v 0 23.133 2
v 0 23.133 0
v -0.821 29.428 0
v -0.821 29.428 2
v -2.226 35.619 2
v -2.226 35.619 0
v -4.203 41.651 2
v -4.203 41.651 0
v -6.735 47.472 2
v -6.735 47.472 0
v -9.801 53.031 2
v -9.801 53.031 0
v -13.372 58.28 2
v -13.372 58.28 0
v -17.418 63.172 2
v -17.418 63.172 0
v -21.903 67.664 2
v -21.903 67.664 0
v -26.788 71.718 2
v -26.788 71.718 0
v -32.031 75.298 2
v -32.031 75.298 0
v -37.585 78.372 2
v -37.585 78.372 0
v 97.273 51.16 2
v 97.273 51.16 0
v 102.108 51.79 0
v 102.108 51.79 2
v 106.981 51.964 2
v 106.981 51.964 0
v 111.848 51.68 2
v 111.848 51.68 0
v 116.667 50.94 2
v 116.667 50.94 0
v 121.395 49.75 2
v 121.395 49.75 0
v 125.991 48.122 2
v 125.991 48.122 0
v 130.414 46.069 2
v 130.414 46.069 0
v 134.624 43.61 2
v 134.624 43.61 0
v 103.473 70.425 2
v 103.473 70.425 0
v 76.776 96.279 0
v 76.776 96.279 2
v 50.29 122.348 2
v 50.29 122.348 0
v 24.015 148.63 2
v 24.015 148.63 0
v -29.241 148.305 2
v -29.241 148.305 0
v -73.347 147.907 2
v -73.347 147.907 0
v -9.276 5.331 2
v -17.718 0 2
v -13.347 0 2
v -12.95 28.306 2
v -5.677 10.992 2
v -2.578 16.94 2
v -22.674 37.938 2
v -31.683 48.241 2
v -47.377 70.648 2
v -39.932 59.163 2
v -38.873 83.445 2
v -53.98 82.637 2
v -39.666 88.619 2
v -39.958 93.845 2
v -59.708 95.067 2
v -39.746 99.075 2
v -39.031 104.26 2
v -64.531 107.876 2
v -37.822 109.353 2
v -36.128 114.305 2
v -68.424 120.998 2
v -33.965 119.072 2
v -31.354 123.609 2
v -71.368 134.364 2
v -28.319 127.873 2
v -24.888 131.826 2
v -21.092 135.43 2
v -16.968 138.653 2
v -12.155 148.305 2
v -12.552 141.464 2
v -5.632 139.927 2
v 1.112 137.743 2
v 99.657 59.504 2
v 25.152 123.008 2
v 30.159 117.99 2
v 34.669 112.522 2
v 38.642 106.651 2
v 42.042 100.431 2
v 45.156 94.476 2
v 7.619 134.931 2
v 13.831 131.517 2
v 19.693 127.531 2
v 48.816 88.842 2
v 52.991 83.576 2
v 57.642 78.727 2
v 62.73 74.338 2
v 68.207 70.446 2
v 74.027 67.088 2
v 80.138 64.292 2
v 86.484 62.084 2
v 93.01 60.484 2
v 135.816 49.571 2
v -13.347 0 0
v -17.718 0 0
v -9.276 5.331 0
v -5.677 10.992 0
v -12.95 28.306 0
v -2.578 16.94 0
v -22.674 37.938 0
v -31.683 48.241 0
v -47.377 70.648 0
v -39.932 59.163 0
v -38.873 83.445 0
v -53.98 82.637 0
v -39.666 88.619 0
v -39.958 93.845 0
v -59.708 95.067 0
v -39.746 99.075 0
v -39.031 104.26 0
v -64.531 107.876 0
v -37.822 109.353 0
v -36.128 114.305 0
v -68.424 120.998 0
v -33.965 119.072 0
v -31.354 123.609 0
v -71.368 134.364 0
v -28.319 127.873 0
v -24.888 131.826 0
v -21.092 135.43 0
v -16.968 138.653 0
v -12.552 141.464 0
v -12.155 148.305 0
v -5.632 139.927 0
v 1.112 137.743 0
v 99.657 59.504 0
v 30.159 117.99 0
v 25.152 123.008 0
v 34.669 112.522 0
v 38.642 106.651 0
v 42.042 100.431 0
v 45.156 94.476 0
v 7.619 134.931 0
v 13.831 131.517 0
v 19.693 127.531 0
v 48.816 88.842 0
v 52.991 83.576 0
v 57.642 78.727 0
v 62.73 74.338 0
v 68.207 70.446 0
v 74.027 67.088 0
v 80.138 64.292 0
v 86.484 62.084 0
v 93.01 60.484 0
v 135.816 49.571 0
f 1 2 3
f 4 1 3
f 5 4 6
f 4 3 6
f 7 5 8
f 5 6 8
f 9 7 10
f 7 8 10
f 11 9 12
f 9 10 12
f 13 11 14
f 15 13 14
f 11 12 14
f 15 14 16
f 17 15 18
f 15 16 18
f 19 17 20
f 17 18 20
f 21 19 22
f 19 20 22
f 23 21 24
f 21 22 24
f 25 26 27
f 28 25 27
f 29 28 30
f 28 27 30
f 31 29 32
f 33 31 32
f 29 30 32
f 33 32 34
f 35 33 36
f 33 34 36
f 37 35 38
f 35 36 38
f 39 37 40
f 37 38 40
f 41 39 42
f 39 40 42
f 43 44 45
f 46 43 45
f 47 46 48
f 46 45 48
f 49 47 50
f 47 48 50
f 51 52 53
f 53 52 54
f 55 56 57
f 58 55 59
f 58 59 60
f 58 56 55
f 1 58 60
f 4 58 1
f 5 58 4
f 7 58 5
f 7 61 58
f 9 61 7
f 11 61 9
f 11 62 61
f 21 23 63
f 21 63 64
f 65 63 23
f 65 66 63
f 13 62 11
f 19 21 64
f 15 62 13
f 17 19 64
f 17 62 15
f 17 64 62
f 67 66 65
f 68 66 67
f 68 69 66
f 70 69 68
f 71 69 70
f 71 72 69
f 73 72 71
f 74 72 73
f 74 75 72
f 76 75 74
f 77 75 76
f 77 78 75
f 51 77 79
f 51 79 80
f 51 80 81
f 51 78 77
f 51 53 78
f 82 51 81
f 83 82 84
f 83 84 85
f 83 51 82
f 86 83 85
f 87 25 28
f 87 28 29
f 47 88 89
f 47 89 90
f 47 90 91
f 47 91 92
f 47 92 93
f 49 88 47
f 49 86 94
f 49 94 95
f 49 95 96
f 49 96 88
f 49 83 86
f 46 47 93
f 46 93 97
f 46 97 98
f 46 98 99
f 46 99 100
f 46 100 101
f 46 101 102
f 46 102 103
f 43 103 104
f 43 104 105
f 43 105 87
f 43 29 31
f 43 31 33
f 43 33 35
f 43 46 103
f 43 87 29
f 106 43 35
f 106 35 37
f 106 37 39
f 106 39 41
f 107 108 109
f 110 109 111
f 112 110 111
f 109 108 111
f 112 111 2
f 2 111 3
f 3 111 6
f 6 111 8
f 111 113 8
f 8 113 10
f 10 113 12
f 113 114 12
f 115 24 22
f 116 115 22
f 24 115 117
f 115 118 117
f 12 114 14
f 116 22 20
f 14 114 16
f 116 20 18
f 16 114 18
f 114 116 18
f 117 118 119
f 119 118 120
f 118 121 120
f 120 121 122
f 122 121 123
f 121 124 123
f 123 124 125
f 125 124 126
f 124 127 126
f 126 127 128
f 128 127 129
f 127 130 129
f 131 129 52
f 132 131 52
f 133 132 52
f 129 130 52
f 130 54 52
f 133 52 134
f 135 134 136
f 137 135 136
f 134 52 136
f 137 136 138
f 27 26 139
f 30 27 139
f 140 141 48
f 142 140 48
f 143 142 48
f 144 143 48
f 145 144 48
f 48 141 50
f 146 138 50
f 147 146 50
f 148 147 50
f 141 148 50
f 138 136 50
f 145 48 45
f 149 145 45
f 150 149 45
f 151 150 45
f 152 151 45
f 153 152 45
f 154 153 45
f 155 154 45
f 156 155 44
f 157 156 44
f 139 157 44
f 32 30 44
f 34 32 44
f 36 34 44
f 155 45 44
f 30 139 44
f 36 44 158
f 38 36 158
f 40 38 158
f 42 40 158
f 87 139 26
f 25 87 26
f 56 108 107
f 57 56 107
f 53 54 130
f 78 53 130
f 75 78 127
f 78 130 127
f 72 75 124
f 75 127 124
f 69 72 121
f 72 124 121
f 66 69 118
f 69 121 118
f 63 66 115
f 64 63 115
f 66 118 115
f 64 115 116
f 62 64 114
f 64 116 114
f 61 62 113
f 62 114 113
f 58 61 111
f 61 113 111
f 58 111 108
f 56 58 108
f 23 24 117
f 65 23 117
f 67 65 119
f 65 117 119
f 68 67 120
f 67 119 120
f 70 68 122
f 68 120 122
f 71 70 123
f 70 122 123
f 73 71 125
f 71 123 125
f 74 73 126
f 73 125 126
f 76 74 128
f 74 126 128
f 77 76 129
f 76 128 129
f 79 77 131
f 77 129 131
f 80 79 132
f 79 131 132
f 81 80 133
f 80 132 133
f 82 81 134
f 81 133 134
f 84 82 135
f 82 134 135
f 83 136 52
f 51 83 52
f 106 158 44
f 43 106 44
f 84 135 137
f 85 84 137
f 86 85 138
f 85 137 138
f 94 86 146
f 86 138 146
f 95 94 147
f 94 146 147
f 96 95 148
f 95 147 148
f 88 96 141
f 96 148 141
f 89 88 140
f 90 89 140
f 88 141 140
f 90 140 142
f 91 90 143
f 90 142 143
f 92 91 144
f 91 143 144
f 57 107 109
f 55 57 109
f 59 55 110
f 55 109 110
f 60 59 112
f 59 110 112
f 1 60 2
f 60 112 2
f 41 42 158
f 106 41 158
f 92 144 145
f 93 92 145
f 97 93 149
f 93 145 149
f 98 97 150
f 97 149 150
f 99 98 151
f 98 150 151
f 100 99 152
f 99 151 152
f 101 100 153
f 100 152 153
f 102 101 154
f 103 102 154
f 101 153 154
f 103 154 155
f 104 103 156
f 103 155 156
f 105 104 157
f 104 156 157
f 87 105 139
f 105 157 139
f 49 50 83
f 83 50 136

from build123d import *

# Parameters (mm, degrees)
F1_DEPTH = 2


# Not quite as in the source:
# - a feature names something its author has since deleted; it is built from what else it names


with BuildPart() as f1:
    # F0 (on Top) → F1 (new body)
    with BuildSketch(Plane.XY):
        with BuildLine():
            Line((-17.7180729806, 0), (-13.3472634479, 0))
            ThreePointArc((-13.3472634479, 0), (-5.6771986993, 10.9915241569), (0, 23.1328960508))
            ThreePointArc((0, 23.1328960508), (-11.5247073045, 55.6975197064), (-37.5854000449, 78.3715993166))
            ThreePointArc((-37.5854000449, 78.3715993166), (-36.1278357664, 114.3054992712), (-12.5523087913, 141.4636322597))
            ThreePointArc((-12.5523087913, 141.4636322597), (19.6930692126, 127.5307837734), (42.0421807398, 100.4308597236))
            ThreePointArc((42.0421807398, 100.4308597236), (65.4226402571, 72.3273330377), (99.6574273635, 59.5041723042))
            Line((99.6574273635, 59.5041723042), (97.2733384301, 51.1598982899))
            ThreePointArc((97.2733384301, 51.1598982899), (116.6670679291, 50.9395271005), (134.6239036251, 43.610314378))
            Line((134.6239036251, 43.610314378), (135.8159518172, 49.5705106347))
            Line((135.8159518172, 49.5705106347), (103.4726053476, 70.4246684909))
            ThreePointArc((103.4726053476, 70.4246684909), (63.5065429383, 109.2866549818), (24.0146897469, 148.6304431832))
            Line((24.0146897469, 148.6304431832), (-12.1552264318, 148.3045816422))
            Line((-12.1552264318, 148.3045816422), (-29.2411223054, 148.3045816422))
            Line((-29.2411223054, 148.3045816422), (-73.3465850353, 147.9072272778))
            ThreePointArc((-73.3465850353, 147.9072272778), (-53.9798913788, 82.6367857077), (-12.9499193281, 28.30594033))
            Line((-12.9499193281, 28.30594033), (-17.7180729806, 0))
        make_face()
    extrude(amount=F1_DEPTH)


solid = f1.part
